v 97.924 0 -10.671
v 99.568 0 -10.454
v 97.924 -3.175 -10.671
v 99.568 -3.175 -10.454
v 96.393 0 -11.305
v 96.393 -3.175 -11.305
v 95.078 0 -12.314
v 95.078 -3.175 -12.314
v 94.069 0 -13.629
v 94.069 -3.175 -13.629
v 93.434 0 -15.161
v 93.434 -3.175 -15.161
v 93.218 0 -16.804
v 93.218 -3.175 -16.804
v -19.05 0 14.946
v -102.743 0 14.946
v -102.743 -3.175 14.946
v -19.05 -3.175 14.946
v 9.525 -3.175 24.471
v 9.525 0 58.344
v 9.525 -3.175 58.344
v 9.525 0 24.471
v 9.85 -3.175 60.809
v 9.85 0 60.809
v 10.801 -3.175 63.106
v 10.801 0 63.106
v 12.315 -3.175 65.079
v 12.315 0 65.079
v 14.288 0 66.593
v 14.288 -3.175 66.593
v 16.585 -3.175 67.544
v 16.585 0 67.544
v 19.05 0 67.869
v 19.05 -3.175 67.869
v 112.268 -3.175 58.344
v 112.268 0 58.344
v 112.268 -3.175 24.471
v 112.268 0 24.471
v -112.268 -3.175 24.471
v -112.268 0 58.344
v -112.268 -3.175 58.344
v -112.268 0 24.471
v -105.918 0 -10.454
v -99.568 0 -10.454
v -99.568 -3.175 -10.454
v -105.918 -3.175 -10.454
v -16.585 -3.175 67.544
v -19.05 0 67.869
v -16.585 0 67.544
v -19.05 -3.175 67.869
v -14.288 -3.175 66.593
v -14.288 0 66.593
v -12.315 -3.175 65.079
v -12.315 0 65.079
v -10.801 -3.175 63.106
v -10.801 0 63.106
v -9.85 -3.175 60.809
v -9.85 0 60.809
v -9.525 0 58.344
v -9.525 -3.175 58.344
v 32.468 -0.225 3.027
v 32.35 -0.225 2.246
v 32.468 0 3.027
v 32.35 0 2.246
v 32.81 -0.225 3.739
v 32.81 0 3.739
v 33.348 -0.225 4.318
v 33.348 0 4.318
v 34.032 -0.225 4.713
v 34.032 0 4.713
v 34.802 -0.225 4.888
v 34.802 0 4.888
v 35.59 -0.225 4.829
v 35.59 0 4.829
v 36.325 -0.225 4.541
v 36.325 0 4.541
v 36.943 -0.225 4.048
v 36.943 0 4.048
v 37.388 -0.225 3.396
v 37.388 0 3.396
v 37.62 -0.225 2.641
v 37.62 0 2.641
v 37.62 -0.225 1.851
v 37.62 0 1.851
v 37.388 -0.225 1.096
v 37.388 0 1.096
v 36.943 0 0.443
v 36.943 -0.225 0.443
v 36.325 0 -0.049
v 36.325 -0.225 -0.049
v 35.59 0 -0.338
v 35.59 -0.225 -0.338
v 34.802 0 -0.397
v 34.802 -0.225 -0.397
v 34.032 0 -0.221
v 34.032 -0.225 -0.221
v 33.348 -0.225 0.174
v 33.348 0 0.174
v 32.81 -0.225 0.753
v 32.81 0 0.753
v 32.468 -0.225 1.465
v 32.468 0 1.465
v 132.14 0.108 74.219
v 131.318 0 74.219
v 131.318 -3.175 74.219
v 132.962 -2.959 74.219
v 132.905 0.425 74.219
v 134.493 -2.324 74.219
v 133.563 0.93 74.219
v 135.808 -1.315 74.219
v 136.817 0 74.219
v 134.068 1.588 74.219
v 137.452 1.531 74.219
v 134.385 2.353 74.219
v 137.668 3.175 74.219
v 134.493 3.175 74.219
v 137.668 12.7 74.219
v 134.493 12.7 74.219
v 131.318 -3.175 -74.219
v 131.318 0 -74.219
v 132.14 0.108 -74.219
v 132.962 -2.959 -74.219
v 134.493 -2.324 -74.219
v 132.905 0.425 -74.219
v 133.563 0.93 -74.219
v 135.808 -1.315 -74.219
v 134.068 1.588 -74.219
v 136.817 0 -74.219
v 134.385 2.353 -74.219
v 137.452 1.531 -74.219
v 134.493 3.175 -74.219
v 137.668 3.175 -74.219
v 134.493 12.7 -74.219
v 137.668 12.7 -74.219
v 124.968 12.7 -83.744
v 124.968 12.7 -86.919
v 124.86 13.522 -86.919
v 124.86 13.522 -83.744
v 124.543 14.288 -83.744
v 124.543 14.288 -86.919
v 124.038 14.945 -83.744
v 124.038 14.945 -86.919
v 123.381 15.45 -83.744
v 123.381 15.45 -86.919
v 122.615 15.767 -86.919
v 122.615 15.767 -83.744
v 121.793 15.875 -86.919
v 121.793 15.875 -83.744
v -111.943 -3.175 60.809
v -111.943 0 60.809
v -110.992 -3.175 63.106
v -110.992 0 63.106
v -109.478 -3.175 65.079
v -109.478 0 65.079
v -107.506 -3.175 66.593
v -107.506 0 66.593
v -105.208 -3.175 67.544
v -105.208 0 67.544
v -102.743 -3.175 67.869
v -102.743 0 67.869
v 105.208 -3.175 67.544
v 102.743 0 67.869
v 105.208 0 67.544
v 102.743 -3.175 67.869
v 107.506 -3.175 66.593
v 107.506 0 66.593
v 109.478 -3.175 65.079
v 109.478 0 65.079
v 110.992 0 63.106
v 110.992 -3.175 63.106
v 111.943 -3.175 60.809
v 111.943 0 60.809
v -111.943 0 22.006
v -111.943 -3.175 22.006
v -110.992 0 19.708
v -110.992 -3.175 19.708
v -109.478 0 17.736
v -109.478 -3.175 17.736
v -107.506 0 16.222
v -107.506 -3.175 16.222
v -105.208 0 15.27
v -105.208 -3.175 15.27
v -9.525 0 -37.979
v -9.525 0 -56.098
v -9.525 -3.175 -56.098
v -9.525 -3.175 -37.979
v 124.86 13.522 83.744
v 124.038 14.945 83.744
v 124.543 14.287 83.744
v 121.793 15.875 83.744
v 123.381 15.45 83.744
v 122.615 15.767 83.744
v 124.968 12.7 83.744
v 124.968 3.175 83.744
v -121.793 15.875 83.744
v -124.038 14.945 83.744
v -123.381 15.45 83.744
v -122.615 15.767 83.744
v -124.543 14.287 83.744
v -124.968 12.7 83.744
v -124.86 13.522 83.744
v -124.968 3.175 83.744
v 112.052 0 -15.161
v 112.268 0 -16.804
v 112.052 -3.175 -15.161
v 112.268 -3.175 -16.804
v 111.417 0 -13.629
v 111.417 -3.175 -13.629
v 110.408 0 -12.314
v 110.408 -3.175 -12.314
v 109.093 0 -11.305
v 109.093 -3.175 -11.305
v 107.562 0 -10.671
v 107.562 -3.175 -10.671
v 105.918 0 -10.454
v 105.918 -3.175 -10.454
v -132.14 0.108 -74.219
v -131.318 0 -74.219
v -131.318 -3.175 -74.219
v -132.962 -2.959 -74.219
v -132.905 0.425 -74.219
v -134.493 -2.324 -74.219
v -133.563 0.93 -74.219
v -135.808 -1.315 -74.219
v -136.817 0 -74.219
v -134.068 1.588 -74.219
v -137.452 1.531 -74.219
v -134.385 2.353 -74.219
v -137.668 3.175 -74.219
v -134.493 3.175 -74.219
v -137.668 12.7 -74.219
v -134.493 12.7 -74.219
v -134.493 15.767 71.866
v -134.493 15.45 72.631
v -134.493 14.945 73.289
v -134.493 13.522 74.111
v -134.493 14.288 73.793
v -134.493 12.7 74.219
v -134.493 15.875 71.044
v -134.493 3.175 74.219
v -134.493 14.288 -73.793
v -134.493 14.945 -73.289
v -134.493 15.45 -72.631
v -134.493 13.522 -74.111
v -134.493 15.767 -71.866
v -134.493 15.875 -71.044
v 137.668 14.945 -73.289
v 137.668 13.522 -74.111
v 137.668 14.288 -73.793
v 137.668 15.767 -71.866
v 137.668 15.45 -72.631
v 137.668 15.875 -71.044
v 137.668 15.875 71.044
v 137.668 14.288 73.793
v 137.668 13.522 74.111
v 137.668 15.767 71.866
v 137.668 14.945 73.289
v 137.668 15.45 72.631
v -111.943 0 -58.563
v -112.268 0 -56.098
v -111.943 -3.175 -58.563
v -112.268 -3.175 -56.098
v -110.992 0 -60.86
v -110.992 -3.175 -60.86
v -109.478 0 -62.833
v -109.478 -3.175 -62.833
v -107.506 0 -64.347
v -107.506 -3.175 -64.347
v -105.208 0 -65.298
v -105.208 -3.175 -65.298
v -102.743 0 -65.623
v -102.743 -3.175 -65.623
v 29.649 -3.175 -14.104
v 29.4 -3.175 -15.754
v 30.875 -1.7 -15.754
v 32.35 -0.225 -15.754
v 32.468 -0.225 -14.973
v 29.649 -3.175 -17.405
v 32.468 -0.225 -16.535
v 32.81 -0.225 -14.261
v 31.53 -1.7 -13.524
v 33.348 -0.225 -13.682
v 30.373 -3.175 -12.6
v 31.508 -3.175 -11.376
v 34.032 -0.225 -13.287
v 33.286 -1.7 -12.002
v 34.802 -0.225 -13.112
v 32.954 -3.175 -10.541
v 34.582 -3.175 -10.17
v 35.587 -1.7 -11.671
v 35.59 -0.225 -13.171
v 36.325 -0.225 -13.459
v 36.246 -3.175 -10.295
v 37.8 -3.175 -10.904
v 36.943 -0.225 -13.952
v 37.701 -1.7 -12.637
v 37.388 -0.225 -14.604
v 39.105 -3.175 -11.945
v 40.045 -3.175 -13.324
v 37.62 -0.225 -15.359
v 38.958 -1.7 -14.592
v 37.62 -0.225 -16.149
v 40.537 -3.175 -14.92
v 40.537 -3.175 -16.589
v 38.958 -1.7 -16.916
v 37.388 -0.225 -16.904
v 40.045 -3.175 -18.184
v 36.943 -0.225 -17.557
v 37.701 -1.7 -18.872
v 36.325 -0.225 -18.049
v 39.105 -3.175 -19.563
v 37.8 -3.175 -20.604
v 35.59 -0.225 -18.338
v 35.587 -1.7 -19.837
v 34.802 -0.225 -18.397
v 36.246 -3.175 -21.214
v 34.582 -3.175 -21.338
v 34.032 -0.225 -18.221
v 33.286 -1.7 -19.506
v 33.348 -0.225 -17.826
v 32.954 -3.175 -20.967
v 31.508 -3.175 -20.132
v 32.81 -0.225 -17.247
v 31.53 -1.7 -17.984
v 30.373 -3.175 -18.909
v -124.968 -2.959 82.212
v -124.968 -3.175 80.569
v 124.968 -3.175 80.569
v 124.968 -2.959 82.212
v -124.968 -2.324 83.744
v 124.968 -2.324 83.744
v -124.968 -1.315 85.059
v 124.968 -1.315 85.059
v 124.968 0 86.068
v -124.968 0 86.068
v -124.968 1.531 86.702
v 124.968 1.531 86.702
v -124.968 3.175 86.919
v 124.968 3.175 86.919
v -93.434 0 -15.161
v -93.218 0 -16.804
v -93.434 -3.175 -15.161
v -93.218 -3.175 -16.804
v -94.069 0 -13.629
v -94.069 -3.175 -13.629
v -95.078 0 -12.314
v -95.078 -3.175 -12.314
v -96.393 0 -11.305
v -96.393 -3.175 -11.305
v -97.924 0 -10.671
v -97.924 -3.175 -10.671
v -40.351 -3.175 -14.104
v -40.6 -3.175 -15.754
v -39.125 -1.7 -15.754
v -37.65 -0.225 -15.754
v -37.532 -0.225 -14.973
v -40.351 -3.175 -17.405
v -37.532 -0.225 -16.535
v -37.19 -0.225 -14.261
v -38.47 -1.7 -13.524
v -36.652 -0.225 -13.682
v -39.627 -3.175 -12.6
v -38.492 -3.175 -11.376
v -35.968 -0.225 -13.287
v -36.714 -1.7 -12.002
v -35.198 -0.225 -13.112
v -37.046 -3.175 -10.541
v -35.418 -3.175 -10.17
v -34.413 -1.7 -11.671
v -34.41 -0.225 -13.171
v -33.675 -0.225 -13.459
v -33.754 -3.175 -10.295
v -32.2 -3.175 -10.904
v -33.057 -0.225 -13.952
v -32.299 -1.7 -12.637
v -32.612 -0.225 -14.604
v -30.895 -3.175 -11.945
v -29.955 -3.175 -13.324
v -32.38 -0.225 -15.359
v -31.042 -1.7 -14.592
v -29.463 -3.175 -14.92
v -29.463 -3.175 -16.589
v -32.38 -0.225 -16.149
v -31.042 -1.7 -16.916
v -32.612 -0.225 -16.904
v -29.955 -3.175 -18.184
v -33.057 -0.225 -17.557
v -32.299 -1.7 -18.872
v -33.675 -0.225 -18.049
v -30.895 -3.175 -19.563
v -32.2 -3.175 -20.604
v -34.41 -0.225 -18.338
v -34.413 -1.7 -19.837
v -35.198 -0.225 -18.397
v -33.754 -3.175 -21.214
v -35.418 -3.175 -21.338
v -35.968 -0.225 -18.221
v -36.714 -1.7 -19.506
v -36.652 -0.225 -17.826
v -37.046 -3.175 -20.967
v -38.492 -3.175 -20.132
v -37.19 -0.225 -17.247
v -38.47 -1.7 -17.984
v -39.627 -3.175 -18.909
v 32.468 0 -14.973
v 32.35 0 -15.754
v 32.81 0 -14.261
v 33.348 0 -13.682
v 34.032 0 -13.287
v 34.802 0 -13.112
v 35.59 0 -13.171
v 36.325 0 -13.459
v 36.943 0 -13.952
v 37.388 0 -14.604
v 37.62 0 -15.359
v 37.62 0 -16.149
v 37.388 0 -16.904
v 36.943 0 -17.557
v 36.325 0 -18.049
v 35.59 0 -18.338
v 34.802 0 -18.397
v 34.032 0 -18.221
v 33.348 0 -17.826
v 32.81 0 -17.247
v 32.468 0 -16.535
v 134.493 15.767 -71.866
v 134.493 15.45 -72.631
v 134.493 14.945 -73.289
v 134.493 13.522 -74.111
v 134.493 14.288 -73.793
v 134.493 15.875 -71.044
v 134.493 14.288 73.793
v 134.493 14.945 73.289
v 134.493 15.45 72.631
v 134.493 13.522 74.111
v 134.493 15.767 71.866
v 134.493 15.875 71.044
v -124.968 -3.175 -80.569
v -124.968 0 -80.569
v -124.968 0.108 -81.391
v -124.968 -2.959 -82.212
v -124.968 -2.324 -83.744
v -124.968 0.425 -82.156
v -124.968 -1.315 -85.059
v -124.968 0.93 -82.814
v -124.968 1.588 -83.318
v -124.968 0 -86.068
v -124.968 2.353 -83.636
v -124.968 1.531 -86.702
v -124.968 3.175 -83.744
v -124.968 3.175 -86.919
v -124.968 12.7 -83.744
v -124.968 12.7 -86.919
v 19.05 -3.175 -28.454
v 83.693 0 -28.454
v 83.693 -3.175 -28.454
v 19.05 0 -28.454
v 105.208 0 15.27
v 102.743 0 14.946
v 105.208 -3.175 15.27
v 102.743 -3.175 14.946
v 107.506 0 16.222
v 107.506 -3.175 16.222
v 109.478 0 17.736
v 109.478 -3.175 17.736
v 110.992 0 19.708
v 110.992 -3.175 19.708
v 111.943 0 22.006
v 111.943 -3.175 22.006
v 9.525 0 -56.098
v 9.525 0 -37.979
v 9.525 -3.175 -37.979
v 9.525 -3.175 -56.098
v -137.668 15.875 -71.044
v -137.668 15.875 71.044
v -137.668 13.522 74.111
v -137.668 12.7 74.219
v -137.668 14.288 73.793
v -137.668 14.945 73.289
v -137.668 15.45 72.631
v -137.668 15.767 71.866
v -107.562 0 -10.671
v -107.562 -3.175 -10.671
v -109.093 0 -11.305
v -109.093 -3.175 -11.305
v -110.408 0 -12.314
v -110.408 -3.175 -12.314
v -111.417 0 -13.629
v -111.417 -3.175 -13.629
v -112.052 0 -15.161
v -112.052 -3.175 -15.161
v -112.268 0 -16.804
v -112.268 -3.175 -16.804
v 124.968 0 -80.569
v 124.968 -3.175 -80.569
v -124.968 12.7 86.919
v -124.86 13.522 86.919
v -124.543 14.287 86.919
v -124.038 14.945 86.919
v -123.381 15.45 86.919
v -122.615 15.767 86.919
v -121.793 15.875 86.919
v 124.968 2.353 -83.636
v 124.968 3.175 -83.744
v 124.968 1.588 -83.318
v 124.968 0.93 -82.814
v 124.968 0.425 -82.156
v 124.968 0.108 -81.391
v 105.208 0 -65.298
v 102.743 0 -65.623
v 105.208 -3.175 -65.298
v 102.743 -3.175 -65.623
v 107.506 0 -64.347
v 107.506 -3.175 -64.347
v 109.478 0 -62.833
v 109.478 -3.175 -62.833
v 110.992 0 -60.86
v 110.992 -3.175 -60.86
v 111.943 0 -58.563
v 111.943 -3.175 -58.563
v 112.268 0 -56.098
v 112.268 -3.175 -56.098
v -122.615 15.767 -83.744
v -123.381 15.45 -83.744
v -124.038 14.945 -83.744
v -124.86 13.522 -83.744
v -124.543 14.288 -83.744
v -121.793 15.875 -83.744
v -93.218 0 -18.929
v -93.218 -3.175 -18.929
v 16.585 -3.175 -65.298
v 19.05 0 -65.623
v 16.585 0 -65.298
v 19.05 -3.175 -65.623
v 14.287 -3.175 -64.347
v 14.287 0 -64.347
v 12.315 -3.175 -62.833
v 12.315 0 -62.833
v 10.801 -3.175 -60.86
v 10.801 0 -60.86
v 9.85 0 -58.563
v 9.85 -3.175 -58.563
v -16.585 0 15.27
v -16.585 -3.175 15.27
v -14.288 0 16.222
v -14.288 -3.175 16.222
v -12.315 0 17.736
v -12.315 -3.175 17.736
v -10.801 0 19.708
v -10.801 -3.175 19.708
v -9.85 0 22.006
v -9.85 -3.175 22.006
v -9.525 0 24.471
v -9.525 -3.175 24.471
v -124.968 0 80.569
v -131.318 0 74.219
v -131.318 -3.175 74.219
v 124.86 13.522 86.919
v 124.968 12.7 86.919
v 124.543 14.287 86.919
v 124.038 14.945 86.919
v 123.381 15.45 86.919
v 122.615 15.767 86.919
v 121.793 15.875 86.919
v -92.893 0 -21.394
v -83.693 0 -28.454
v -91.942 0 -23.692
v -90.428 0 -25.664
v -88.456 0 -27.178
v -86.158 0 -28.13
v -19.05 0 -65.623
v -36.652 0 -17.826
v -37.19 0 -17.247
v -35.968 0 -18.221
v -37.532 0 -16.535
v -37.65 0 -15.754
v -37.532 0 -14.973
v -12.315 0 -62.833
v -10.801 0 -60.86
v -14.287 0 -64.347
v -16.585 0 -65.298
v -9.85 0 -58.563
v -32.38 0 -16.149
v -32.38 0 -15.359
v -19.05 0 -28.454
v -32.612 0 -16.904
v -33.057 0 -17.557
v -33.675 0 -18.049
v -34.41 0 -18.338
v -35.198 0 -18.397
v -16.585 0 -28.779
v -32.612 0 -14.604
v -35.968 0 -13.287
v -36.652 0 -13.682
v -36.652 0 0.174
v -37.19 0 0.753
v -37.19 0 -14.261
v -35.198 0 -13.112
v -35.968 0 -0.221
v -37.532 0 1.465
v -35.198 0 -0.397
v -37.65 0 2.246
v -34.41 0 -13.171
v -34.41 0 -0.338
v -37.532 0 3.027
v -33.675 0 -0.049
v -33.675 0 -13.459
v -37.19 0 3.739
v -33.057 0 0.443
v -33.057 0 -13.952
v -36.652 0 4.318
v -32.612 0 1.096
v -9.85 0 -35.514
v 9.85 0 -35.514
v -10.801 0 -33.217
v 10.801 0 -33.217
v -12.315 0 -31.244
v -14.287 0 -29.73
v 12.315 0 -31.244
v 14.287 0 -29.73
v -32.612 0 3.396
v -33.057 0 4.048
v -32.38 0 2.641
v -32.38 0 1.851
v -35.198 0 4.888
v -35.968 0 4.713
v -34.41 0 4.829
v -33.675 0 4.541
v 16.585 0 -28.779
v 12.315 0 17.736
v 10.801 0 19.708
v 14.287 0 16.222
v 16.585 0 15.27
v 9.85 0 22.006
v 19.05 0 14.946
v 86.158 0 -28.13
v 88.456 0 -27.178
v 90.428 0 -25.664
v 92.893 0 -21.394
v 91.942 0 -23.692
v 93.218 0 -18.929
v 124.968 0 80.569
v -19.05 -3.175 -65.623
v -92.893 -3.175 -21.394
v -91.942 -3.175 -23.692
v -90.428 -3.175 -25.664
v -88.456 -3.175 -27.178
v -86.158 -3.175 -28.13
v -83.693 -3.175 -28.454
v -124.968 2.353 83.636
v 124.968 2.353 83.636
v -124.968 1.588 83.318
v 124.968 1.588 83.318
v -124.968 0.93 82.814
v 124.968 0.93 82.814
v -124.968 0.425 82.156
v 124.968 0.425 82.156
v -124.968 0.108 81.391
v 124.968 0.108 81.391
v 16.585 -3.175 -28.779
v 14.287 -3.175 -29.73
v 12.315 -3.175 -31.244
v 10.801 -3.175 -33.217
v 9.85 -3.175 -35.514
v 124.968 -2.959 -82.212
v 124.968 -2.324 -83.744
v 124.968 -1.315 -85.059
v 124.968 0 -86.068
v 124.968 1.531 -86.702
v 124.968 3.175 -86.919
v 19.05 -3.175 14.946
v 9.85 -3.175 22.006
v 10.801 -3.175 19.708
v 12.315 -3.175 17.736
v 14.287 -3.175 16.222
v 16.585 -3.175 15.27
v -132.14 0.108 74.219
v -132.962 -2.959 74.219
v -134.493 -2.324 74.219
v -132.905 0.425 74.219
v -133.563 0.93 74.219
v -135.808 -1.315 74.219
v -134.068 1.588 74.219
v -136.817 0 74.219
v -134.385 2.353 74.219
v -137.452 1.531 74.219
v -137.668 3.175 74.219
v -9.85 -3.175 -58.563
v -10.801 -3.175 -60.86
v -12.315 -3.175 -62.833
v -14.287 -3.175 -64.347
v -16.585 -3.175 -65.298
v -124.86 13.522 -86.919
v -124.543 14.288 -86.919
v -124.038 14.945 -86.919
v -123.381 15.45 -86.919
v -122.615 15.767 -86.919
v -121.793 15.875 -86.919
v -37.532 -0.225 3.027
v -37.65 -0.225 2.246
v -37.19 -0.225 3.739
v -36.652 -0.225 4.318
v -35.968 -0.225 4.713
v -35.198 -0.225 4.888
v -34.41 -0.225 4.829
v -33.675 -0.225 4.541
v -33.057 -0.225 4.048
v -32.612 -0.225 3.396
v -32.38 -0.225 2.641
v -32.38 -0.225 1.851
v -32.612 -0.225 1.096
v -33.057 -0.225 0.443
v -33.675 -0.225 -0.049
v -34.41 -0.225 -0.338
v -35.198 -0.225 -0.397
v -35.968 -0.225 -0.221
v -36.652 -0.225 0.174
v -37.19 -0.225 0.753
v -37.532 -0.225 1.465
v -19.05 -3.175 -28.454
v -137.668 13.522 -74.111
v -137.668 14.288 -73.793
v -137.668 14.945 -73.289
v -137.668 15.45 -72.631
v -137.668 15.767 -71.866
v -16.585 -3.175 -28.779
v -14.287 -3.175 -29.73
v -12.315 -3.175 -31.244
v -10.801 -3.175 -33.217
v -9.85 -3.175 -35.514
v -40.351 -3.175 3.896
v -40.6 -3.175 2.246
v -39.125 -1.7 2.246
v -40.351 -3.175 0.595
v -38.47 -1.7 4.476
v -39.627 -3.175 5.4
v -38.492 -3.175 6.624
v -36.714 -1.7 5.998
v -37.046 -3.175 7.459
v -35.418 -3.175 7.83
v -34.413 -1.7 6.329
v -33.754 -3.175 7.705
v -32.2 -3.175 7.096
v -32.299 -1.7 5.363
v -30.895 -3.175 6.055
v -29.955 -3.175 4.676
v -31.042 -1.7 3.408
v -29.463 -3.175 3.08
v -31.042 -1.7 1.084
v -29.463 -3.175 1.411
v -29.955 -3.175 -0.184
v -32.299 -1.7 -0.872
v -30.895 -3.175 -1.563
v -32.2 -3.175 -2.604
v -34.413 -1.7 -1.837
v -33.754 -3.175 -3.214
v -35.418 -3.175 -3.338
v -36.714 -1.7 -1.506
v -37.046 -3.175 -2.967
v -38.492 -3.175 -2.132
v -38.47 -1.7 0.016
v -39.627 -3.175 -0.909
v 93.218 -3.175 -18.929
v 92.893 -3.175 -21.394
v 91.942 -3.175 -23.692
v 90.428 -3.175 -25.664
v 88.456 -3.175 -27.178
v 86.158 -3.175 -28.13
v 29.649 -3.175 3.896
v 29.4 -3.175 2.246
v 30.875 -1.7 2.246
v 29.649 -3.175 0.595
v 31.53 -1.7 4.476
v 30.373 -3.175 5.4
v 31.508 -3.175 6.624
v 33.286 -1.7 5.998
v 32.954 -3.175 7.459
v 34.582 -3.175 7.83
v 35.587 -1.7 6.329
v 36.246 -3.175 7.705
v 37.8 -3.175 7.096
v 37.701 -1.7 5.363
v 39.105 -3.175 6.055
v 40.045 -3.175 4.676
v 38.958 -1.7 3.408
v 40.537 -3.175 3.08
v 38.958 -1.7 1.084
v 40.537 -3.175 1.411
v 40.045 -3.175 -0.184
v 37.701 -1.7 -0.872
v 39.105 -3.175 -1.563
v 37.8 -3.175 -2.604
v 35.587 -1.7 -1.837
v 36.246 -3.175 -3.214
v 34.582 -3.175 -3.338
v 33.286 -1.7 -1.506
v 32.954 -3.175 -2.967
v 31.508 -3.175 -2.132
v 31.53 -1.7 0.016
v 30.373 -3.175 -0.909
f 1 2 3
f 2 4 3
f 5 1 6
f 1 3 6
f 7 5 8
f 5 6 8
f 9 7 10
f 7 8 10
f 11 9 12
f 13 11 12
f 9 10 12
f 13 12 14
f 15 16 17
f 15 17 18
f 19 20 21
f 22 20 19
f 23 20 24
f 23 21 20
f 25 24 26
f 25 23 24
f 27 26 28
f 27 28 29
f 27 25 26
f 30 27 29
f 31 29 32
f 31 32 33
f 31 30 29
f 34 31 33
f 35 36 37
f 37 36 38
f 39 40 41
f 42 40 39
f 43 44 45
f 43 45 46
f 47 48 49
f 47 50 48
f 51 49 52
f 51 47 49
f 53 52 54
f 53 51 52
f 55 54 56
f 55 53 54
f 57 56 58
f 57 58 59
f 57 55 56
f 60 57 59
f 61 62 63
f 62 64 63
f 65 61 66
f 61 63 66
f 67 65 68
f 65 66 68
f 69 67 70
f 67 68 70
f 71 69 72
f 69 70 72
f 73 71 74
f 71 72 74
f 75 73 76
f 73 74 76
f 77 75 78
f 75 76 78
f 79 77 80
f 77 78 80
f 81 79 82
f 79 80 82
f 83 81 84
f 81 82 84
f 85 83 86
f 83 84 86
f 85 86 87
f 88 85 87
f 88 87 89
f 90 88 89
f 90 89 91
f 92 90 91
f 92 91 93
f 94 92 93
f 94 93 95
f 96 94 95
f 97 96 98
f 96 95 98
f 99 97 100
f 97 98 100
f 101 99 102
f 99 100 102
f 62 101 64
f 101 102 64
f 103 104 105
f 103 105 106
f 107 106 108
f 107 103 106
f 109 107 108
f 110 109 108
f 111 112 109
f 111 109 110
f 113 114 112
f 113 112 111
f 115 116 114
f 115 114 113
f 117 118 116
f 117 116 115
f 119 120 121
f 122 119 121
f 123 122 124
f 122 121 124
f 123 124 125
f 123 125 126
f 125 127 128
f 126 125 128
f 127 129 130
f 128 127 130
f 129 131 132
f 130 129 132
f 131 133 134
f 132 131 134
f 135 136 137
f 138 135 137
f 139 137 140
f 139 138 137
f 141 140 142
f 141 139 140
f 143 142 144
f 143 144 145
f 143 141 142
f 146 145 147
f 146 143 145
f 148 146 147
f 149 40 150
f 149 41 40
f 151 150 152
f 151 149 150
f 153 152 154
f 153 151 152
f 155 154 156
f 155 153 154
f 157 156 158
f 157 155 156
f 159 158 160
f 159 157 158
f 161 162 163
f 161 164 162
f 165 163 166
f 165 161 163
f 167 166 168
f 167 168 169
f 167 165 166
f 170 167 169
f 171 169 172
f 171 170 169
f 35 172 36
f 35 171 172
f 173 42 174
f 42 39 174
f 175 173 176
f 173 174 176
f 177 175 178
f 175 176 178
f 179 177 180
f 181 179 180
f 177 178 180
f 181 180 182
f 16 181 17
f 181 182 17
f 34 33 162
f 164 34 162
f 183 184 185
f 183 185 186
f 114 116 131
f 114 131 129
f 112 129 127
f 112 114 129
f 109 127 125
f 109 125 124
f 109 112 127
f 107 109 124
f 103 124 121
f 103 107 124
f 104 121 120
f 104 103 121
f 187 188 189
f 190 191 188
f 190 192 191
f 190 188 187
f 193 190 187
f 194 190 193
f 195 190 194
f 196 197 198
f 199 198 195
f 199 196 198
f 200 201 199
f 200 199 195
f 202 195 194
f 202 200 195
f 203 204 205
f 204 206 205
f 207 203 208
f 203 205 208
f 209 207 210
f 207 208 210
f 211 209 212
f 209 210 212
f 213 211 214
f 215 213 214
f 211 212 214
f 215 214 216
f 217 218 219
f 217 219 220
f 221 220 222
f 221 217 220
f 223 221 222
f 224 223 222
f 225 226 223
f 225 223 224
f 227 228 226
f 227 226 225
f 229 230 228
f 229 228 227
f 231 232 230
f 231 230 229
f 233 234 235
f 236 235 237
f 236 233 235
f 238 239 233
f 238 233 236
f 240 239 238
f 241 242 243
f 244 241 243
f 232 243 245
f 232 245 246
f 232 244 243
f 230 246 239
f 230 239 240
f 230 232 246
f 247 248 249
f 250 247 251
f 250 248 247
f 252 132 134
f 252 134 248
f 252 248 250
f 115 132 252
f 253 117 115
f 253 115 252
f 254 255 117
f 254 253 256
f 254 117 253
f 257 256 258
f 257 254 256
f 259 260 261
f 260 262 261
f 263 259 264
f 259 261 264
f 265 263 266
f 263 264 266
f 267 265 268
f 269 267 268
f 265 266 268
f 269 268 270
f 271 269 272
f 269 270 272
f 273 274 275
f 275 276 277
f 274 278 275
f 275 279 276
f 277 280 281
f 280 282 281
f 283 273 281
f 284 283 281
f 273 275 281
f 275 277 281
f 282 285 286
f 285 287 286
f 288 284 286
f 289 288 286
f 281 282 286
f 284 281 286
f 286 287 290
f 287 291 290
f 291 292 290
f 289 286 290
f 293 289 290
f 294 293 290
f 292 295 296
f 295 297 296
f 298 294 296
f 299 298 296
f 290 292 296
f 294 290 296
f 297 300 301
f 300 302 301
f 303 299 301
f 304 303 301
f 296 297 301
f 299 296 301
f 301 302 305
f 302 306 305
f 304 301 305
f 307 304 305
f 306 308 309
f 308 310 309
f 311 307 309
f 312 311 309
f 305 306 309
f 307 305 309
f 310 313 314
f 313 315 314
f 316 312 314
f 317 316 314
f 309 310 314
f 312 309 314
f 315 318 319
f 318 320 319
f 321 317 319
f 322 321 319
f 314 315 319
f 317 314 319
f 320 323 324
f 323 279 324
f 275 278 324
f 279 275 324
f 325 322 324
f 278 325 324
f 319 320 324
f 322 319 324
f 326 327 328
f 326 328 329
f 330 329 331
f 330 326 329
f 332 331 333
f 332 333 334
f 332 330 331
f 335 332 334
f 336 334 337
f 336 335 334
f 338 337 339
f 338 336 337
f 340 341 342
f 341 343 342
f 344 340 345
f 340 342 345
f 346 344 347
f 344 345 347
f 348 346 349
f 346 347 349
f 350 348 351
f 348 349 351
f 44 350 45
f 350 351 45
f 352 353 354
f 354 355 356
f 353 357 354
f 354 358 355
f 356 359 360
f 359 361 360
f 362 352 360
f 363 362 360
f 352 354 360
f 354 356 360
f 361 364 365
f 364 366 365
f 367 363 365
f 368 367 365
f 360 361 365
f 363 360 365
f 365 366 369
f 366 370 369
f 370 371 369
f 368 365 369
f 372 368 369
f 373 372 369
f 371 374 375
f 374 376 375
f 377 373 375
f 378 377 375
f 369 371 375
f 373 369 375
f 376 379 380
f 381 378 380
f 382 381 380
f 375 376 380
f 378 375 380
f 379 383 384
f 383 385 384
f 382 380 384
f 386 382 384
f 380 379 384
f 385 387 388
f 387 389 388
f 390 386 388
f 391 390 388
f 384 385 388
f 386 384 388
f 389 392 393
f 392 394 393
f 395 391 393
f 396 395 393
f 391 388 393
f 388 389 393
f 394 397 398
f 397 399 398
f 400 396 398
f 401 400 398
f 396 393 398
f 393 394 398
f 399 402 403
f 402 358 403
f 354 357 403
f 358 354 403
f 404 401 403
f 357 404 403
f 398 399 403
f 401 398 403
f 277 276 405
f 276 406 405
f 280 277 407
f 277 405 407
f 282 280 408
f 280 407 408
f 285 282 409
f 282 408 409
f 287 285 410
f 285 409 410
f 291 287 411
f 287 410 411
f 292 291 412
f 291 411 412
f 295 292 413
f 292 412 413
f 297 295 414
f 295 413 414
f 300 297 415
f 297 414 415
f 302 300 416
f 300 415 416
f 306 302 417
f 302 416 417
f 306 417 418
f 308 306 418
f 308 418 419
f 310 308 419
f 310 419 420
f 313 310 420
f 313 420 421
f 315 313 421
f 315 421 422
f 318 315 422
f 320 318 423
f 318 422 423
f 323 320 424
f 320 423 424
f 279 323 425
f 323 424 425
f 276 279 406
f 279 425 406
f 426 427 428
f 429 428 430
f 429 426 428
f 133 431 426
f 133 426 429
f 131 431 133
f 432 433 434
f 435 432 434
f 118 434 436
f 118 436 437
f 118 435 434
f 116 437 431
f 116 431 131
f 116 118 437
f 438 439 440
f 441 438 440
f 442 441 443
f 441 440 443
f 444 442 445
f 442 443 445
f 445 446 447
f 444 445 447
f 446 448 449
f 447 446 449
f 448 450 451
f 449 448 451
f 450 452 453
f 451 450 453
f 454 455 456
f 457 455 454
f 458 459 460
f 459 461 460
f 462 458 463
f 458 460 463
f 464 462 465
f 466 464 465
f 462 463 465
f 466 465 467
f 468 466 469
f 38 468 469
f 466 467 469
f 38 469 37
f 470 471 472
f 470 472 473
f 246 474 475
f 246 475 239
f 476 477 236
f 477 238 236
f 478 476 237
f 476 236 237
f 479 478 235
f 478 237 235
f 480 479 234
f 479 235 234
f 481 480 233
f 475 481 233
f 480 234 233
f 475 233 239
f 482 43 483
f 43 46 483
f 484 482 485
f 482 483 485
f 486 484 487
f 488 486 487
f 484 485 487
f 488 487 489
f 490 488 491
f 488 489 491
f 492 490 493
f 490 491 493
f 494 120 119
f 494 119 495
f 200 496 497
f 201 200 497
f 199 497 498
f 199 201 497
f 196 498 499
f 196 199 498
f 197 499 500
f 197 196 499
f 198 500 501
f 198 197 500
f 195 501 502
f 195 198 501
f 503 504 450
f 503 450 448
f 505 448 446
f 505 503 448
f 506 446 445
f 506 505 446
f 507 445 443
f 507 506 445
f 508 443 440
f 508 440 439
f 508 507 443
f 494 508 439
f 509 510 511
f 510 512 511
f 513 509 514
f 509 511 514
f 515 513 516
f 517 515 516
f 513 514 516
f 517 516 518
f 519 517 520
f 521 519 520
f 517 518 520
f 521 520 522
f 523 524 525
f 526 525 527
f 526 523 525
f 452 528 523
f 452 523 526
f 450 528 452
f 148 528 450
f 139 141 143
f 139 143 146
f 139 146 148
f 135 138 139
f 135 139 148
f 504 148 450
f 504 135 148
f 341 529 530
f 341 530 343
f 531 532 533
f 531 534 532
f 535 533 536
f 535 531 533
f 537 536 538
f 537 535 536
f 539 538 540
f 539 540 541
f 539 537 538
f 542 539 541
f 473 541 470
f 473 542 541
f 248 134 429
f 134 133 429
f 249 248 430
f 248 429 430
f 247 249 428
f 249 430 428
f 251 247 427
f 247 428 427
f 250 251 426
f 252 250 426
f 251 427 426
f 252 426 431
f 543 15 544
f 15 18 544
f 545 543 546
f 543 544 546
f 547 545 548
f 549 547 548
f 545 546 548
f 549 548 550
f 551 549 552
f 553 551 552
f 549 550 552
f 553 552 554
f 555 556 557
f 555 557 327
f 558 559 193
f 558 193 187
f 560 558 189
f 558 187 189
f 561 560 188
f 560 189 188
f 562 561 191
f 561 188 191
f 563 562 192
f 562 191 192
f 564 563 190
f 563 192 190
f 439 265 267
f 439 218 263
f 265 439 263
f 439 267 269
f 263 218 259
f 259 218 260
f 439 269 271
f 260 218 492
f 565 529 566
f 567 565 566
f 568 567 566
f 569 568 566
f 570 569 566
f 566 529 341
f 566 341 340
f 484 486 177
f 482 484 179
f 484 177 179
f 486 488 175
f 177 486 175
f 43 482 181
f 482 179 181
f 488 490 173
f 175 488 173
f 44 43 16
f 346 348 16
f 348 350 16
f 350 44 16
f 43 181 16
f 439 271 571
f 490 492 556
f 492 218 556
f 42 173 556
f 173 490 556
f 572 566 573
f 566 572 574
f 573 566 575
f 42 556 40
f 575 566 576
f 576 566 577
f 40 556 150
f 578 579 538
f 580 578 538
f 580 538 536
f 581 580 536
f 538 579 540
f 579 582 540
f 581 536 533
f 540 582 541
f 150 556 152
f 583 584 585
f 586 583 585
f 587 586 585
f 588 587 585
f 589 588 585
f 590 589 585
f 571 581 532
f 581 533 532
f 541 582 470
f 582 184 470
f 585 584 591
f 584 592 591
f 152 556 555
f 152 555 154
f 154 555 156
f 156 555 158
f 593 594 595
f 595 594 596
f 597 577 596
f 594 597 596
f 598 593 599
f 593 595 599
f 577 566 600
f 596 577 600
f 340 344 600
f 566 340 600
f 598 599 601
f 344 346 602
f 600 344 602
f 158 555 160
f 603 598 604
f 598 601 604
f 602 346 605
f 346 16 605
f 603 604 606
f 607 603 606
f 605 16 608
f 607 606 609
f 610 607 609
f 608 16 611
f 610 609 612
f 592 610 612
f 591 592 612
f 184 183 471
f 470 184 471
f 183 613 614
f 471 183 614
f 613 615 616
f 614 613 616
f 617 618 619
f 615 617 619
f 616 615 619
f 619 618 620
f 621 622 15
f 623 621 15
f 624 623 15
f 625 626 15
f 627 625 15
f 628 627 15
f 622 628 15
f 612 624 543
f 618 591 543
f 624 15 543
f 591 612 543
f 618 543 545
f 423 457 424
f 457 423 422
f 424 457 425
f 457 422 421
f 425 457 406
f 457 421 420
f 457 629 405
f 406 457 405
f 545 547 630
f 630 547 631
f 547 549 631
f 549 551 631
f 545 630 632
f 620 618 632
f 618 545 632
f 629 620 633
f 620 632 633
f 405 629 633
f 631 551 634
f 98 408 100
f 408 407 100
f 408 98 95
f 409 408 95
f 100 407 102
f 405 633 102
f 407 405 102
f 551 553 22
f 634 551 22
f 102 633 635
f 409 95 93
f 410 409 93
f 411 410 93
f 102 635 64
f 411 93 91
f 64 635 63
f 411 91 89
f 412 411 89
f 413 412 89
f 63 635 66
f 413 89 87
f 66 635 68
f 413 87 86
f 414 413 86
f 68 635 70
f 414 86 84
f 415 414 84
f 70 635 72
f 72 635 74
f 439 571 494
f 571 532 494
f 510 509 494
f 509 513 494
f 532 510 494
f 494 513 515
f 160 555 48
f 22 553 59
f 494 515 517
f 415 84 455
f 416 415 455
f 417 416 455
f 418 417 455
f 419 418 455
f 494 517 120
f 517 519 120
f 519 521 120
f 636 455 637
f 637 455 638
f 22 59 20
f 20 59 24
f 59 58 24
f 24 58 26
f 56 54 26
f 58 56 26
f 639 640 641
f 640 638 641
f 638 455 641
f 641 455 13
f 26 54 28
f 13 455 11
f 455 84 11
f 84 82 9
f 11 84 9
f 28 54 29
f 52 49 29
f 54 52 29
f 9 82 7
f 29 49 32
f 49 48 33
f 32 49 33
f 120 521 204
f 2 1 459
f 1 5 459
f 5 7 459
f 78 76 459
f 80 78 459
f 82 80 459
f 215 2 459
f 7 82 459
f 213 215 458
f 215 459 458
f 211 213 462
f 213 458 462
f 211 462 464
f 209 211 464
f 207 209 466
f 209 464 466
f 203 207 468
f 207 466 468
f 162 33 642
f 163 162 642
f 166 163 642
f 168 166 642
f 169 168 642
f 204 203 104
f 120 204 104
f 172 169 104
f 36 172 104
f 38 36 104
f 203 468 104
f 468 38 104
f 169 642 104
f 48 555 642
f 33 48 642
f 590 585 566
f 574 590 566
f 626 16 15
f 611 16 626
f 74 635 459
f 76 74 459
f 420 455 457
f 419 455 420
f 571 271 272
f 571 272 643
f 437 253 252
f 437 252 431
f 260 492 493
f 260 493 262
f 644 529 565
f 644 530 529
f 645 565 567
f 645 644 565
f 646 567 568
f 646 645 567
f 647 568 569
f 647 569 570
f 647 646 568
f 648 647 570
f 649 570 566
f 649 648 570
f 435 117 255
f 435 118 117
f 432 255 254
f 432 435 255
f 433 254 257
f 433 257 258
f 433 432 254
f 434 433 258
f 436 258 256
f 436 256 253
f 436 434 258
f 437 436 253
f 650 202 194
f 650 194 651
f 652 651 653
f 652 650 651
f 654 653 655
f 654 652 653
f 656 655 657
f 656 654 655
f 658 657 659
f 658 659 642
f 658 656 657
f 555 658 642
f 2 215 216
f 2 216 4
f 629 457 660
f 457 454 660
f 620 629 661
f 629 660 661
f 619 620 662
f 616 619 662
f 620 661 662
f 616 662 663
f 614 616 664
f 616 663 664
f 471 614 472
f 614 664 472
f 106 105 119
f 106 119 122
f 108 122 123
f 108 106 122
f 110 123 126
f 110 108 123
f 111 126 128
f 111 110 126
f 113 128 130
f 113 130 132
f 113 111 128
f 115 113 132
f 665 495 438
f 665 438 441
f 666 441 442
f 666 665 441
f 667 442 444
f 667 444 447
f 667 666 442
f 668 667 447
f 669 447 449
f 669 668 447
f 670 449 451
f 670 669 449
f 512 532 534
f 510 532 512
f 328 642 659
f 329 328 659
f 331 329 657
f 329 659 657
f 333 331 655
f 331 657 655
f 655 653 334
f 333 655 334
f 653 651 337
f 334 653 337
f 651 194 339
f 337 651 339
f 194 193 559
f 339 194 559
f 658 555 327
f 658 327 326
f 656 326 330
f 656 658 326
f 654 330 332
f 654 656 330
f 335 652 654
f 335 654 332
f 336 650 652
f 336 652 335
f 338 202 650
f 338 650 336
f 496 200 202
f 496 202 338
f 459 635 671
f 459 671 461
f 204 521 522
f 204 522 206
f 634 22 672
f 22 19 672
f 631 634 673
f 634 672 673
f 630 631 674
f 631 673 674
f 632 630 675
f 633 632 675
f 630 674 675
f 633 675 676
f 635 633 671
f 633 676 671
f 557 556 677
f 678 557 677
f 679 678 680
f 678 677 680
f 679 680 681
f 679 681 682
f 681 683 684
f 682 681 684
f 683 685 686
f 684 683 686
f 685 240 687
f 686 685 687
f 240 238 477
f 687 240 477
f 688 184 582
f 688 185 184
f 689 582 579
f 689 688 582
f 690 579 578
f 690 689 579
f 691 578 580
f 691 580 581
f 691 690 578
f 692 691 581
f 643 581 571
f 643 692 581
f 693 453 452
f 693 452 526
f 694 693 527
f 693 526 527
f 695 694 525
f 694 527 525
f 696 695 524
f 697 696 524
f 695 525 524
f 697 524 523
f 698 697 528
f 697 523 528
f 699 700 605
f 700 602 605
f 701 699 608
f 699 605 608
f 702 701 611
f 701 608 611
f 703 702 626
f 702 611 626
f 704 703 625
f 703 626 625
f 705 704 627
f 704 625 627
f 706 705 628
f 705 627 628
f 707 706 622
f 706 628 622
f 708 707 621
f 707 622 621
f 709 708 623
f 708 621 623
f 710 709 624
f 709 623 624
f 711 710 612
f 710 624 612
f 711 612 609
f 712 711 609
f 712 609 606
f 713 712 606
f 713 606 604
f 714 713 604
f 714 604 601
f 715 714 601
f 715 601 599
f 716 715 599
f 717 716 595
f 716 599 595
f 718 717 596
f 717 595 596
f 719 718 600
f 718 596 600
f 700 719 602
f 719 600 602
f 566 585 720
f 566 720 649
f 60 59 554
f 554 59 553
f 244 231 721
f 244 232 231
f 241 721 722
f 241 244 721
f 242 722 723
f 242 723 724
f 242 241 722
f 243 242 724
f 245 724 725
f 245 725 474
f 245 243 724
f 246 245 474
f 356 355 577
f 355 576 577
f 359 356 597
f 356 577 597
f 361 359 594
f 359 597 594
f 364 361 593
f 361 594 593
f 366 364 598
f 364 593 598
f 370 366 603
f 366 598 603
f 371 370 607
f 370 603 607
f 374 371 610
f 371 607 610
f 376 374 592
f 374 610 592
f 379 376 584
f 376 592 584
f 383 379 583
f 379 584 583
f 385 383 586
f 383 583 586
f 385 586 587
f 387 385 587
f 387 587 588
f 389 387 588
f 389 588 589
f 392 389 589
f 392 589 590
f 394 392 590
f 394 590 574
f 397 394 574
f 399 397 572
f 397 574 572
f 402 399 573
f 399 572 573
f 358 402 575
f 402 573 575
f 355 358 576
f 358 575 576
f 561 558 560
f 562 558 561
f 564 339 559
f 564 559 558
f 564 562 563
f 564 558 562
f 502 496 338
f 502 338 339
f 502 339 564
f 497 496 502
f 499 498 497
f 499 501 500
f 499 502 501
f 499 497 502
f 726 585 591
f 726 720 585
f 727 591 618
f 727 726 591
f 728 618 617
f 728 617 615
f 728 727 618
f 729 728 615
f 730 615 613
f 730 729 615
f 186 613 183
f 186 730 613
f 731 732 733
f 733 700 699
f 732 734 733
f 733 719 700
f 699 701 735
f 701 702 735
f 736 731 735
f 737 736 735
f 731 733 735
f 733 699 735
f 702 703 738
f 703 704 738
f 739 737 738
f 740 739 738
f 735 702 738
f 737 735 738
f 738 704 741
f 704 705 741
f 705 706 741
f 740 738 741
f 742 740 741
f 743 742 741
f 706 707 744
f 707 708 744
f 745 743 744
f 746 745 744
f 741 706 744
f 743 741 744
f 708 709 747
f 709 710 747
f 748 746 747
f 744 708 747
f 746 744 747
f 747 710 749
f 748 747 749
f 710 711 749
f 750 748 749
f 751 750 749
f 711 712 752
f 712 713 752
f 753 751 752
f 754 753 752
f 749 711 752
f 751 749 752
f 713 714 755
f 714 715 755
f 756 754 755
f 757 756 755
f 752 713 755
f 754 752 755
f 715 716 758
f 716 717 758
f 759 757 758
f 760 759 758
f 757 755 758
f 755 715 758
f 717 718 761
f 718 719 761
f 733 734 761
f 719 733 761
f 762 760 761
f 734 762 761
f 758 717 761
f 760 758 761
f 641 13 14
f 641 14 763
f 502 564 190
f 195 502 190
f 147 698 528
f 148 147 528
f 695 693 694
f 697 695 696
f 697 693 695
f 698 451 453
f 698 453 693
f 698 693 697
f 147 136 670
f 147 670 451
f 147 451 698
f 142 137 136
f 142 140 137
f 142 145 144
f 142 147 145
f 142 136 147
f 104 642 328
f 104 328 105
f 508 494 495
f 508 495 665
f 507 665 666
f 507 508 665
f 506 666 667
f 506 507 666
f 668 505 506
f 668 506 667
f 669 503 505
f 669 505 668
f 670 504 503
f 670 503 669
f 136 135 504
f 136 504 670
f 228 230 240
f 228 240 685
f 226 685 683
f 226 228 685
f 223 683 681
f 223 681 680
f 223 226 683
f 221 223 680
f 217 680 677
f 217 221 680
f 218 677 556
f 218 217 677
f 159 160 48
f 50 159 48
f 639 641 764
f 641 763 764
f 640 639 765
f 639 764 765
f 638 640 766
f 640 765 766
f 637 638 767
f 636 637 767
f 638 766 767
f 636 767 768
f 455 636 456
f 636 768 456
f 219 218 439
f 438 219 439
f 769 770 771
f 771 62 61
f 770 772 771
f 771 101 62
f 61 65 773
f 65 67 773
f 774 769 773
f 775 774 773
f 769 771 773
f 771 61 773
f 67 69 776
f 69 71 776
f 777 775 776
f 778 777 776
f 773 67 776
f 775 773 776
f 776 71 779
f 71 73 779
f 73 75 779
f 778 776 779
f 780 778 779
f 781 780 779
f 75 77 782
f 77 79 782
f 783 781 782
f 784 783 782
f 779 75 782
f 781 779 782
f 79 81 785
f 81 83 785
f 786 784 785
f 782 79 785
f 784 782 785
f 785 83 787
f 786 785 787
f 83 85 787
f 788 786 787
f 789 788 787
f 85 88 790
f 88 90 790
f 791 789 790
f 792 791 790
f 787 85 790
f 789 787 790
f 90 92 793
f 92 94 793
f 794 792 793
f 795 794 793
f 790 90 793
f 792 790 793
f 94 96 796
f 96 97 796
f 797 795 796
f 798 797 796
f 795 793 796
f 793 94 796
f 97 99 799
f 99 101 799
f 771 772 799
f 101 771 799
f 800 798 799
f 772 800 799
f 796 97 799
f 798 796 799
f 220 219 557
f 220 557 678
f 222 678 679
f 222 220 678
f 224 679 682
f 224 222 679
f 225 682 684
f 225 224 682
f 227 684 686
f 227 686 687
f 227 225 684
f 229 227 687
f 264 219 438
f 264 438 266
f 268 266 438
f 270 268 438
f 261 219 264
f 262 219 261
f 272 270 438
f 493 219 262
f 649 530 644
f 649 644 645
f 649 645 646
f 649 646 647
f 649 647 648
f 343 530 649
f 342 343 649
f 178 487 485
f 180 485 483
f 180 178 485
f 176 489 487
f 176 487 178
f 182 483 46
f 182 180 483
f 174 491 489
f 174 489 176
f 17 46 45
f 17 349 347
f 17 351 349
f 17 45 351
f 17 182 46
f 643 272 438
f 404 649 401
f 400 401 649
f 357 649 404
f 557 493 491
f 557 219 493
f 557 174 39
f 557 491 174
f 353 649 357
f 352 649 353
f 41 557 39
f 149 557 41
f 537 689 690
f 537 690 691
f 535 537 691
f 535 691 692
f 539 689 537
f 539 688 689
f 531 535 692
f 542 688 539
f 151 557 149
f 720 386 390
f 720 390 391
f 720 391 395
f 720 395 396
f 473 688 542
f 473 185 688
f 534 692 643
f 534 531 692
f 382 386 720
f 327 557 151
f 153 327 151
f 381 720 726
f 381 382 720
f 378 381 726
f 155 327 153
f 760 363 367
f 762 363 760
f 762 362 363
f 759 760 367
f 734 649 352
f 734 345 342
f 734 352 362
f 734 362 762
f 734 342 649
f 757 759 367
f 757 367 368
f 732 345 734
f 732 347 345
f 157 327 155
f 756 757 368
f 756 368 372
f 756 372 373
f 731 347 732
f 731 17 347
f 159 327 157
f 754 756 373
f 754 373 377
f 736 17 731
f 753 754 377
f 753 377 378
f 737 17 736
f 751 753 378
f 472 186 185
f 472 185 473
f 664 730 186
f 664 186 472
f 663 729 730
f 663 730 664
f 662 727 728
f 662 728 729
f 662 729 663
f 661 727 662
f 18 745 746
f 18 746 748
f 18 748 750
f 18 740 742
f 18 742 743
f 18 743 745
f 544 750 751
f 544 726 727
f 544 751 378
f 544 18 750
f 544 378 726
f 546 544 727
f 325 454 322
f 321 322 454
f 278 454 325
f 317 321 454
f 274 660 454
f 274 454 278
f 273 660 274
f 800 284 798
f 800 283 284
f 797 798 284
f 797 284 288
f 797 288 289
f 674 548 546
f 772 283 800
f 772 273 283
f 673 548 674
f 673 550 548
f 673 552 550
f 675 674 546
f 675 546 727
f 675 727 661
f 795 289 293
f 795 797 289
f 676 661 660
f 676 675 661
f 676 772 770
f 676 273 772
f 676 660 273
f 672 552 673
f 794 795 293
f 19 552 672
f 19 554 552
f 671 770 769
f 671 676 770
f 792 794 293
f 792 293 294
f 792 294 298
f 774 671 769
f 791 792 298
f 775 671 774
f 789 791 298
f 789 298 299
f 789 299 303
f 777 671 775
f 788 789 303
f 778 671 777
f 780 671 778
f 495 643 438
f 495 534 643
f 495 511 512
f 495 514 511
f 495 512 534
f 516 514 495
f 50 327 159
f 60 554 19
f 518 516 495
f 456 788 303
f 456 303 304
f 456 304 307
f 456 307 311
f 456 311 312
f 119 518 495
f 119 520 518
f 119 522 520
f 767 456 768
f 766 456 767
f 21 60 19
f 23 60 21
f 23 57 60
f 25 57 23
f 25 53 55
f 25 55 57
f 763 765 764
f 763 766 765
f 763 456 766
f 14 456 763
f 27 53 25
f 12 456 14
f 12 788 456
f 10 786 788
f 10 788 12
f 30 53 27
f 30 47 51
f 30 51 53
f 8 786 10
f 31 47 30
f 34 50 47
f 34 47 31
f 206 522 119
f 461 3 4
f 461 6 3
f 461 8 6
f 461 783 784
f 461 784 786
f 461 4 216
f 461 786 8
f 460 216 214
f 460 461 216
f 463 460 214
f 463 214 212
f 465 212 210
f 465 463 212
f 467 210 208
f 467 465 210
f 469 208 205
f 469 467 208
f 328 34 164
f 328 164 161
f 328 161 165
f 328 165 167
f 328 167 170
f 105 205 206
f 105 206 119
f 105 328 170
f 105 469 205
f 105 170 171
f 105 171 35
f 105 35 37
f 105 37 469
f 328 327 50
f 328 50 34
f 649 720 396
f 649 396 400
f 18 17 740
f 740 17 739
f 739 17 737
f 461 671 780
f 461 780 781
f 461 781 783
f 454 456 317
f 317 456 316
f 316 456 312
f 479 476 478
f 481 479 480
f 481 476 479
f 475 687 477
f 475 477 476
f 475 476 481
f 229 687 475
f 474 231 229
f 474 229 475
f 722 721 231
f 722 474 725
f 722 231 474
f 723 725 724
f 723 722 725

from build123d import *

# Parameters (mm, degrees)
SKETCH1_W                     = 262.636
SKETCH1_H                     = 3.175
BASE_FLANGE1_DEPTH            = 80.5688
CUT_EXTRUDE1_DEPTH            = 155.096817886
EDGE_FLANGE2_DEPTH            = 148.4376
EDGE_FLANGE3_DEPTH            = 249.936
EDGE_FLANGE4_DEPTH            = 148.4376
EDGE_FLANGE5_DEPTH            = 249.936
CSK_FOR_M5_SFHCS1_D           = 5.3
CSK_FOR_M5_SFHCS1_CSINK_D     = 11.2
CSK_FOR_M5_SFHCS1_CSINK_ANGLE = 90
CUT_EXTRUDE3_REACH            = 165.583
SKETCH18_W                    = 102.743
SKETCH18_H                    = 52.92295
FILLET2_R                     = 9.525
FILLET3_R                     = 6.35
FILLET4_R                     = 3.175


# Sheet-metal steps are written as plain solids
with BuildPart() as part:
    # Sketch1 → Base-Flange1 (new, symmetric)
    with BuildSketch(Plane.XY):
        with Locations((0, -1.5875)):
            Rectangle(SKETCH1_W, SKETCH1_H)
    extrude(amount=BASE_FLANGE1_DEPTH, both=True)

    # Sketch2 → Cut-Extrude1 (cut, through all)
    with BuildSketch(Plane(origin=(0, 0, 0), x_dir=(-1, 0, 0), z_dir=(0, 1, 0))):
        Polygon((131.318, -80.5688), (131.318, -74.2188), (124.968, -80.5688), align=None)
        Polygon((131.318, 74.2188), (124.968, 80.5688), (131.318, 80.5688), align=None)
        Polygon((-131.318, 80.5688), (-124.968, 80.5688), (-131.318, 74.2188), align=None)
        Polygon((-124.968, -80.5688), (-131.318, -80.5688), (-131.318, -74.2188), align=None)
    extrude(amount=-CUT_EXTRUDE1_DEPTH, mode=Mode.SUBTRACT)

    # Edge-Flange2 section (across the edge) → Edge-Flange2 (add)
    with BuildSketch(Plane(origin=(134.493, 0, 74.2188), x_dir=(-1, 0, 0), z_dir=(0, 0, -1))):
        with BuildLine():
            Line((-3.175, 3.175), (-3.175, 15.875))
            Line((-3.175, 15.875), (0, 15.875))
            Line((0, 15.875), (0, 3.175))
            ThreePointArc((0, 3.175), (0.92993597, 0.92993597), (3.175, 0))
            Line((3.175, 0), (3.175, -3.175))
            ThreePointArc((3.175, -3.175), (-1.315128061, -1.315128061), (-3.175, 3.175))
        make_face()
    extrude(amount=EDGE_FLANGE2_DEPTH)

    # Edge-Flange3 section (across the edge) → Edge-Flange3 (add)
    with BuildSketch(Plane(origin=(-124.968, 0, 83.7438), x_dir=(0, 0, -1), z_dir=(1, 0, 0))):
        with BuildLine():
            Line((-3.175, 3.175), (-3.175, 15.875))
            Line((-3.175, 15.875), (0, 15.875))
            Line((0, 15.875), (0, 3.175))
            ThreePointArc((0, 3.175), (0.92993597, 0.92993597), (3.175, 0))
            Line((3.175, 0), (3.175, -3.175))
            ThreePointArc((3.175, -3.175), (-1.315128061, -1.315128061), (-3.175, 3.175))
        make_face()
    extrude(amount=EDGE_FLANGE3_DEPTH)

    # Edge-Flange4 section (across the edge) → Edge-Flange4 (add)
    with BuildSketch(Plane(origin=(-134.493, 0, -74.2188), x_dir=(1, 0, 0), z_dir=(0, 0, 1))):
        with BuildLine():
            Line((-3.175, 3.175), (-3.175, 15.875))
            Line((-3.175, 15.875), (0, 15.875))
            Line((0, 15.875), (0, 3.175))
            ThreePointArc((0, 3.175), (0.92993597, 0.92993597), (3.175, 0))
            Line((3.175, 0), (3.175, -3.175))
            ThreePointArc((3.175, -3.175), (-1.315128061, -1.315128061), (-3.175, 3.175))
        make_face()
    extrude(amount=EDGE_FLANGE4_DEPTH)

    # Edge-Flange5 section (across the edge) → Edge-Flange5 (add)
    with BuildSketch(Plane(origin=(124.968, 0, -83.7438), x_dir=(0, 0, 1), z_dir=(-1, 0, 0))):
        with BuildLine():
            Line((-3.175, 3.175), (-3.175, 15.875))
            Line((-3.175, 15.875), (0, 15.875))
            Line((0, 15.875), (0, 3.175))
            ThreePointArc((0, 3.175), (0.92993597, 0.92993597), (3.175, 0))
            Line((3.175, 0), (3.175, -3.175))
            ThreePointArc((3.175, -3.175), (-1.315128061, -1.315128061), (-3.175, 3.175))
        make_face()
    extrude(amount=EDGE_FLANGE5_DEPTH)

    # CSK for M5 SFHCS1 (through all)
    with Locations(Plane.XZ.offset(3.175)):
        with Locations((-35, -15.75415), (35, -15.75415), (35, 2.24585), (-35, 2.24585)):
            CounterSinkHole(CSK_FOR_M5_SFHCS1_D / 2, CSK_FOR_M5_SFHCS1_CSINK_D / 2, counter_sink_angle=CSK_FOR_M5_SFHCS1_CSINK_ANGLE)

    # Sketch18 → Cut-Extrude3 (cut, up to next)
    with BuildSketch(Plane(origin=(0, 0, 0), x_dir=(1, 0, 0), z_dir=(0, 1, 0)), mode=Mode.PRIVATE) as cut_extrude3_sk1:
        with Locations((-60.8965, -41.407325)):
            Rectangle(SKETCH18_W, SKETCH18_H)
    cut_extrude3_tool1 = extrude(cut_extrude3_sk1.sketch, amount=-CUT_EXTRUDE3_REACH, mode=Mode.PRIVATE) & part.part
    # Sketch18 → Cut-Extrude3 (cut, up to next)
    with BuildSketch(Plane(origin=(0, 0, 0), x_dir=(1, 0, 0), z_dir=(0, 1, 0)), mode=Mode.PRIVATE) as cut_extrude3_sk2:
        with Locations((60.8965, -41.407325)):
            Rectangle(SKETCH18_W, SKETCH18_H)
    cut_extrude3_tool2 = extrude(cut_extrude3_sk2.sketch, amount=-CUT_EXTRUDE3_REACH, mode=Mode.PRIVATE) & part.part
    # Sketch18 → Cut-Extrude3 (cut, up to next)
    with BuildSketch(Plane(origin=(0, 0, 0), x_dir=(1, 0, 0), z_dir=(0, 1, 0)), mode=Mode.PRIVATE) as cut_extrude3_sk3:
        Polygon((-93.218, 28.45415), (-93.218, 10.45415), (-112.268, 10.45415), (-112.268, 65.62295), (-9.525, 65.62295), (-9.525, 28.45415), align=None)
    cut_extrude3_tool3 = extrude(cut_extrude3_sk3.sketch, amount=-CUT_EXTRUDE3_REACH, mode=Mode.PRIVATE) & part.part
    # Sketch18 → Cut-Extrude3 (cut, up to next)
    with BuildSketch(Plane(origin=(0, 0, 0), x_dir=(1, 0, 0), z_dir=(0, 1, 0)), mode=Mode.PRIVATE) as cut_extrude3_sk4:
        Polygon((9.525, 65.62295), (112.268, 65.62295), (112.268, 10.45415), (93.218, 10.45415), (93.218, 28.45415), (9.525, 28.45415), align=None)
    cut_extrude3_tool4 = extrude(cut_extrude3_sk4.sketch, amount=-CUT_EXTRUDE3_REACH, mode=Mode.PRIVATE) & part.part
    add(cut_extrude3_tool1.solids().sort_by_distance((-60.8965, 0, 41.407325))[0], mode=Mode.SUBTRACT)
    add(cut_extrude3_tool2.solids().sort_by_distance((60.8965, 0, 41.407325))[0], mode=Mode.SUBTRACT)
    add(cut_extrude3_tool3.solids().sort_by_distance((-64.344381, 0, -44.765774))[0], mode=Mode.SUBTRACT)
    add(cut_extrude3_tool4.solids().sort_by_distance((64.344381, 0, -44.765774))[0], mode=Mode.SUBTRACT)

    # Fillet2
    fillet2_edges = [part.edges().sort_by_distance(p)[0] for p in [
        (112.268, -1.5875, 14.94585),
        (112.268, -1.5875, 67.8688),
        (9.525, -1.5875, 67.8688),
        (9.525, -1.5875, 14.94585),
        (-112.268, -1.5875, -65.62295),
        (-9.525, -1.5875, -65.62295),
        (-9.525, -1.5875, -28.45415),
        (-93.218, -1.5875, -28.45415),
        (9.525, -1.5875, -28.45415),
        (9.525, -1.5875, -65.62295),
        (112.268, -1.5875, -65.62295),
        (93.218, -1.5875, -28.45415),
        (-9.525, -1.5875, 14.94585),
        (-9.525, -1.5875, 67.8688),
        (-112.268, -1.5875, 67.8688),
        (-112.268, -1.5875, 14.94585),
    ]]
    fillet(fillet2_edges, radius=FILLET2_R)

    # Fillet3
    fillet3_edges = [part.edges().sort_by_distance(p)[0] for p in [
        (-112.268, -1.5875, -10.45415),
        (-93.218, -1.5875, -10.45415),
        (112.268, -1.5875, -10.45415),
        (93.218, -1.5875, -10.45415),
    ]]
    fillet(fillet3_edges, radius=FILLET3_R)

    # Fillet4
    fillet4_edges = [part.edges().sort_by_distance(p)[0] for p in [
        (-136.0805, 15.875, -74.2188),
        (-136.0805, 15.875, 74.2188),
        (124.968, 15.875, -85.3313),
        (-124.968, 15.875, -85.3313),
        (136.0805, 15.875, 74.2188),
        (136.0805, 15.875, -74.2188),
        (-124.968, 15.875, 85.3313),
        (124.968, 15.875, 85.3313),
    ]]
    fillet(fillet4_edges, radius=FILLET4_R)


solid = part.part
